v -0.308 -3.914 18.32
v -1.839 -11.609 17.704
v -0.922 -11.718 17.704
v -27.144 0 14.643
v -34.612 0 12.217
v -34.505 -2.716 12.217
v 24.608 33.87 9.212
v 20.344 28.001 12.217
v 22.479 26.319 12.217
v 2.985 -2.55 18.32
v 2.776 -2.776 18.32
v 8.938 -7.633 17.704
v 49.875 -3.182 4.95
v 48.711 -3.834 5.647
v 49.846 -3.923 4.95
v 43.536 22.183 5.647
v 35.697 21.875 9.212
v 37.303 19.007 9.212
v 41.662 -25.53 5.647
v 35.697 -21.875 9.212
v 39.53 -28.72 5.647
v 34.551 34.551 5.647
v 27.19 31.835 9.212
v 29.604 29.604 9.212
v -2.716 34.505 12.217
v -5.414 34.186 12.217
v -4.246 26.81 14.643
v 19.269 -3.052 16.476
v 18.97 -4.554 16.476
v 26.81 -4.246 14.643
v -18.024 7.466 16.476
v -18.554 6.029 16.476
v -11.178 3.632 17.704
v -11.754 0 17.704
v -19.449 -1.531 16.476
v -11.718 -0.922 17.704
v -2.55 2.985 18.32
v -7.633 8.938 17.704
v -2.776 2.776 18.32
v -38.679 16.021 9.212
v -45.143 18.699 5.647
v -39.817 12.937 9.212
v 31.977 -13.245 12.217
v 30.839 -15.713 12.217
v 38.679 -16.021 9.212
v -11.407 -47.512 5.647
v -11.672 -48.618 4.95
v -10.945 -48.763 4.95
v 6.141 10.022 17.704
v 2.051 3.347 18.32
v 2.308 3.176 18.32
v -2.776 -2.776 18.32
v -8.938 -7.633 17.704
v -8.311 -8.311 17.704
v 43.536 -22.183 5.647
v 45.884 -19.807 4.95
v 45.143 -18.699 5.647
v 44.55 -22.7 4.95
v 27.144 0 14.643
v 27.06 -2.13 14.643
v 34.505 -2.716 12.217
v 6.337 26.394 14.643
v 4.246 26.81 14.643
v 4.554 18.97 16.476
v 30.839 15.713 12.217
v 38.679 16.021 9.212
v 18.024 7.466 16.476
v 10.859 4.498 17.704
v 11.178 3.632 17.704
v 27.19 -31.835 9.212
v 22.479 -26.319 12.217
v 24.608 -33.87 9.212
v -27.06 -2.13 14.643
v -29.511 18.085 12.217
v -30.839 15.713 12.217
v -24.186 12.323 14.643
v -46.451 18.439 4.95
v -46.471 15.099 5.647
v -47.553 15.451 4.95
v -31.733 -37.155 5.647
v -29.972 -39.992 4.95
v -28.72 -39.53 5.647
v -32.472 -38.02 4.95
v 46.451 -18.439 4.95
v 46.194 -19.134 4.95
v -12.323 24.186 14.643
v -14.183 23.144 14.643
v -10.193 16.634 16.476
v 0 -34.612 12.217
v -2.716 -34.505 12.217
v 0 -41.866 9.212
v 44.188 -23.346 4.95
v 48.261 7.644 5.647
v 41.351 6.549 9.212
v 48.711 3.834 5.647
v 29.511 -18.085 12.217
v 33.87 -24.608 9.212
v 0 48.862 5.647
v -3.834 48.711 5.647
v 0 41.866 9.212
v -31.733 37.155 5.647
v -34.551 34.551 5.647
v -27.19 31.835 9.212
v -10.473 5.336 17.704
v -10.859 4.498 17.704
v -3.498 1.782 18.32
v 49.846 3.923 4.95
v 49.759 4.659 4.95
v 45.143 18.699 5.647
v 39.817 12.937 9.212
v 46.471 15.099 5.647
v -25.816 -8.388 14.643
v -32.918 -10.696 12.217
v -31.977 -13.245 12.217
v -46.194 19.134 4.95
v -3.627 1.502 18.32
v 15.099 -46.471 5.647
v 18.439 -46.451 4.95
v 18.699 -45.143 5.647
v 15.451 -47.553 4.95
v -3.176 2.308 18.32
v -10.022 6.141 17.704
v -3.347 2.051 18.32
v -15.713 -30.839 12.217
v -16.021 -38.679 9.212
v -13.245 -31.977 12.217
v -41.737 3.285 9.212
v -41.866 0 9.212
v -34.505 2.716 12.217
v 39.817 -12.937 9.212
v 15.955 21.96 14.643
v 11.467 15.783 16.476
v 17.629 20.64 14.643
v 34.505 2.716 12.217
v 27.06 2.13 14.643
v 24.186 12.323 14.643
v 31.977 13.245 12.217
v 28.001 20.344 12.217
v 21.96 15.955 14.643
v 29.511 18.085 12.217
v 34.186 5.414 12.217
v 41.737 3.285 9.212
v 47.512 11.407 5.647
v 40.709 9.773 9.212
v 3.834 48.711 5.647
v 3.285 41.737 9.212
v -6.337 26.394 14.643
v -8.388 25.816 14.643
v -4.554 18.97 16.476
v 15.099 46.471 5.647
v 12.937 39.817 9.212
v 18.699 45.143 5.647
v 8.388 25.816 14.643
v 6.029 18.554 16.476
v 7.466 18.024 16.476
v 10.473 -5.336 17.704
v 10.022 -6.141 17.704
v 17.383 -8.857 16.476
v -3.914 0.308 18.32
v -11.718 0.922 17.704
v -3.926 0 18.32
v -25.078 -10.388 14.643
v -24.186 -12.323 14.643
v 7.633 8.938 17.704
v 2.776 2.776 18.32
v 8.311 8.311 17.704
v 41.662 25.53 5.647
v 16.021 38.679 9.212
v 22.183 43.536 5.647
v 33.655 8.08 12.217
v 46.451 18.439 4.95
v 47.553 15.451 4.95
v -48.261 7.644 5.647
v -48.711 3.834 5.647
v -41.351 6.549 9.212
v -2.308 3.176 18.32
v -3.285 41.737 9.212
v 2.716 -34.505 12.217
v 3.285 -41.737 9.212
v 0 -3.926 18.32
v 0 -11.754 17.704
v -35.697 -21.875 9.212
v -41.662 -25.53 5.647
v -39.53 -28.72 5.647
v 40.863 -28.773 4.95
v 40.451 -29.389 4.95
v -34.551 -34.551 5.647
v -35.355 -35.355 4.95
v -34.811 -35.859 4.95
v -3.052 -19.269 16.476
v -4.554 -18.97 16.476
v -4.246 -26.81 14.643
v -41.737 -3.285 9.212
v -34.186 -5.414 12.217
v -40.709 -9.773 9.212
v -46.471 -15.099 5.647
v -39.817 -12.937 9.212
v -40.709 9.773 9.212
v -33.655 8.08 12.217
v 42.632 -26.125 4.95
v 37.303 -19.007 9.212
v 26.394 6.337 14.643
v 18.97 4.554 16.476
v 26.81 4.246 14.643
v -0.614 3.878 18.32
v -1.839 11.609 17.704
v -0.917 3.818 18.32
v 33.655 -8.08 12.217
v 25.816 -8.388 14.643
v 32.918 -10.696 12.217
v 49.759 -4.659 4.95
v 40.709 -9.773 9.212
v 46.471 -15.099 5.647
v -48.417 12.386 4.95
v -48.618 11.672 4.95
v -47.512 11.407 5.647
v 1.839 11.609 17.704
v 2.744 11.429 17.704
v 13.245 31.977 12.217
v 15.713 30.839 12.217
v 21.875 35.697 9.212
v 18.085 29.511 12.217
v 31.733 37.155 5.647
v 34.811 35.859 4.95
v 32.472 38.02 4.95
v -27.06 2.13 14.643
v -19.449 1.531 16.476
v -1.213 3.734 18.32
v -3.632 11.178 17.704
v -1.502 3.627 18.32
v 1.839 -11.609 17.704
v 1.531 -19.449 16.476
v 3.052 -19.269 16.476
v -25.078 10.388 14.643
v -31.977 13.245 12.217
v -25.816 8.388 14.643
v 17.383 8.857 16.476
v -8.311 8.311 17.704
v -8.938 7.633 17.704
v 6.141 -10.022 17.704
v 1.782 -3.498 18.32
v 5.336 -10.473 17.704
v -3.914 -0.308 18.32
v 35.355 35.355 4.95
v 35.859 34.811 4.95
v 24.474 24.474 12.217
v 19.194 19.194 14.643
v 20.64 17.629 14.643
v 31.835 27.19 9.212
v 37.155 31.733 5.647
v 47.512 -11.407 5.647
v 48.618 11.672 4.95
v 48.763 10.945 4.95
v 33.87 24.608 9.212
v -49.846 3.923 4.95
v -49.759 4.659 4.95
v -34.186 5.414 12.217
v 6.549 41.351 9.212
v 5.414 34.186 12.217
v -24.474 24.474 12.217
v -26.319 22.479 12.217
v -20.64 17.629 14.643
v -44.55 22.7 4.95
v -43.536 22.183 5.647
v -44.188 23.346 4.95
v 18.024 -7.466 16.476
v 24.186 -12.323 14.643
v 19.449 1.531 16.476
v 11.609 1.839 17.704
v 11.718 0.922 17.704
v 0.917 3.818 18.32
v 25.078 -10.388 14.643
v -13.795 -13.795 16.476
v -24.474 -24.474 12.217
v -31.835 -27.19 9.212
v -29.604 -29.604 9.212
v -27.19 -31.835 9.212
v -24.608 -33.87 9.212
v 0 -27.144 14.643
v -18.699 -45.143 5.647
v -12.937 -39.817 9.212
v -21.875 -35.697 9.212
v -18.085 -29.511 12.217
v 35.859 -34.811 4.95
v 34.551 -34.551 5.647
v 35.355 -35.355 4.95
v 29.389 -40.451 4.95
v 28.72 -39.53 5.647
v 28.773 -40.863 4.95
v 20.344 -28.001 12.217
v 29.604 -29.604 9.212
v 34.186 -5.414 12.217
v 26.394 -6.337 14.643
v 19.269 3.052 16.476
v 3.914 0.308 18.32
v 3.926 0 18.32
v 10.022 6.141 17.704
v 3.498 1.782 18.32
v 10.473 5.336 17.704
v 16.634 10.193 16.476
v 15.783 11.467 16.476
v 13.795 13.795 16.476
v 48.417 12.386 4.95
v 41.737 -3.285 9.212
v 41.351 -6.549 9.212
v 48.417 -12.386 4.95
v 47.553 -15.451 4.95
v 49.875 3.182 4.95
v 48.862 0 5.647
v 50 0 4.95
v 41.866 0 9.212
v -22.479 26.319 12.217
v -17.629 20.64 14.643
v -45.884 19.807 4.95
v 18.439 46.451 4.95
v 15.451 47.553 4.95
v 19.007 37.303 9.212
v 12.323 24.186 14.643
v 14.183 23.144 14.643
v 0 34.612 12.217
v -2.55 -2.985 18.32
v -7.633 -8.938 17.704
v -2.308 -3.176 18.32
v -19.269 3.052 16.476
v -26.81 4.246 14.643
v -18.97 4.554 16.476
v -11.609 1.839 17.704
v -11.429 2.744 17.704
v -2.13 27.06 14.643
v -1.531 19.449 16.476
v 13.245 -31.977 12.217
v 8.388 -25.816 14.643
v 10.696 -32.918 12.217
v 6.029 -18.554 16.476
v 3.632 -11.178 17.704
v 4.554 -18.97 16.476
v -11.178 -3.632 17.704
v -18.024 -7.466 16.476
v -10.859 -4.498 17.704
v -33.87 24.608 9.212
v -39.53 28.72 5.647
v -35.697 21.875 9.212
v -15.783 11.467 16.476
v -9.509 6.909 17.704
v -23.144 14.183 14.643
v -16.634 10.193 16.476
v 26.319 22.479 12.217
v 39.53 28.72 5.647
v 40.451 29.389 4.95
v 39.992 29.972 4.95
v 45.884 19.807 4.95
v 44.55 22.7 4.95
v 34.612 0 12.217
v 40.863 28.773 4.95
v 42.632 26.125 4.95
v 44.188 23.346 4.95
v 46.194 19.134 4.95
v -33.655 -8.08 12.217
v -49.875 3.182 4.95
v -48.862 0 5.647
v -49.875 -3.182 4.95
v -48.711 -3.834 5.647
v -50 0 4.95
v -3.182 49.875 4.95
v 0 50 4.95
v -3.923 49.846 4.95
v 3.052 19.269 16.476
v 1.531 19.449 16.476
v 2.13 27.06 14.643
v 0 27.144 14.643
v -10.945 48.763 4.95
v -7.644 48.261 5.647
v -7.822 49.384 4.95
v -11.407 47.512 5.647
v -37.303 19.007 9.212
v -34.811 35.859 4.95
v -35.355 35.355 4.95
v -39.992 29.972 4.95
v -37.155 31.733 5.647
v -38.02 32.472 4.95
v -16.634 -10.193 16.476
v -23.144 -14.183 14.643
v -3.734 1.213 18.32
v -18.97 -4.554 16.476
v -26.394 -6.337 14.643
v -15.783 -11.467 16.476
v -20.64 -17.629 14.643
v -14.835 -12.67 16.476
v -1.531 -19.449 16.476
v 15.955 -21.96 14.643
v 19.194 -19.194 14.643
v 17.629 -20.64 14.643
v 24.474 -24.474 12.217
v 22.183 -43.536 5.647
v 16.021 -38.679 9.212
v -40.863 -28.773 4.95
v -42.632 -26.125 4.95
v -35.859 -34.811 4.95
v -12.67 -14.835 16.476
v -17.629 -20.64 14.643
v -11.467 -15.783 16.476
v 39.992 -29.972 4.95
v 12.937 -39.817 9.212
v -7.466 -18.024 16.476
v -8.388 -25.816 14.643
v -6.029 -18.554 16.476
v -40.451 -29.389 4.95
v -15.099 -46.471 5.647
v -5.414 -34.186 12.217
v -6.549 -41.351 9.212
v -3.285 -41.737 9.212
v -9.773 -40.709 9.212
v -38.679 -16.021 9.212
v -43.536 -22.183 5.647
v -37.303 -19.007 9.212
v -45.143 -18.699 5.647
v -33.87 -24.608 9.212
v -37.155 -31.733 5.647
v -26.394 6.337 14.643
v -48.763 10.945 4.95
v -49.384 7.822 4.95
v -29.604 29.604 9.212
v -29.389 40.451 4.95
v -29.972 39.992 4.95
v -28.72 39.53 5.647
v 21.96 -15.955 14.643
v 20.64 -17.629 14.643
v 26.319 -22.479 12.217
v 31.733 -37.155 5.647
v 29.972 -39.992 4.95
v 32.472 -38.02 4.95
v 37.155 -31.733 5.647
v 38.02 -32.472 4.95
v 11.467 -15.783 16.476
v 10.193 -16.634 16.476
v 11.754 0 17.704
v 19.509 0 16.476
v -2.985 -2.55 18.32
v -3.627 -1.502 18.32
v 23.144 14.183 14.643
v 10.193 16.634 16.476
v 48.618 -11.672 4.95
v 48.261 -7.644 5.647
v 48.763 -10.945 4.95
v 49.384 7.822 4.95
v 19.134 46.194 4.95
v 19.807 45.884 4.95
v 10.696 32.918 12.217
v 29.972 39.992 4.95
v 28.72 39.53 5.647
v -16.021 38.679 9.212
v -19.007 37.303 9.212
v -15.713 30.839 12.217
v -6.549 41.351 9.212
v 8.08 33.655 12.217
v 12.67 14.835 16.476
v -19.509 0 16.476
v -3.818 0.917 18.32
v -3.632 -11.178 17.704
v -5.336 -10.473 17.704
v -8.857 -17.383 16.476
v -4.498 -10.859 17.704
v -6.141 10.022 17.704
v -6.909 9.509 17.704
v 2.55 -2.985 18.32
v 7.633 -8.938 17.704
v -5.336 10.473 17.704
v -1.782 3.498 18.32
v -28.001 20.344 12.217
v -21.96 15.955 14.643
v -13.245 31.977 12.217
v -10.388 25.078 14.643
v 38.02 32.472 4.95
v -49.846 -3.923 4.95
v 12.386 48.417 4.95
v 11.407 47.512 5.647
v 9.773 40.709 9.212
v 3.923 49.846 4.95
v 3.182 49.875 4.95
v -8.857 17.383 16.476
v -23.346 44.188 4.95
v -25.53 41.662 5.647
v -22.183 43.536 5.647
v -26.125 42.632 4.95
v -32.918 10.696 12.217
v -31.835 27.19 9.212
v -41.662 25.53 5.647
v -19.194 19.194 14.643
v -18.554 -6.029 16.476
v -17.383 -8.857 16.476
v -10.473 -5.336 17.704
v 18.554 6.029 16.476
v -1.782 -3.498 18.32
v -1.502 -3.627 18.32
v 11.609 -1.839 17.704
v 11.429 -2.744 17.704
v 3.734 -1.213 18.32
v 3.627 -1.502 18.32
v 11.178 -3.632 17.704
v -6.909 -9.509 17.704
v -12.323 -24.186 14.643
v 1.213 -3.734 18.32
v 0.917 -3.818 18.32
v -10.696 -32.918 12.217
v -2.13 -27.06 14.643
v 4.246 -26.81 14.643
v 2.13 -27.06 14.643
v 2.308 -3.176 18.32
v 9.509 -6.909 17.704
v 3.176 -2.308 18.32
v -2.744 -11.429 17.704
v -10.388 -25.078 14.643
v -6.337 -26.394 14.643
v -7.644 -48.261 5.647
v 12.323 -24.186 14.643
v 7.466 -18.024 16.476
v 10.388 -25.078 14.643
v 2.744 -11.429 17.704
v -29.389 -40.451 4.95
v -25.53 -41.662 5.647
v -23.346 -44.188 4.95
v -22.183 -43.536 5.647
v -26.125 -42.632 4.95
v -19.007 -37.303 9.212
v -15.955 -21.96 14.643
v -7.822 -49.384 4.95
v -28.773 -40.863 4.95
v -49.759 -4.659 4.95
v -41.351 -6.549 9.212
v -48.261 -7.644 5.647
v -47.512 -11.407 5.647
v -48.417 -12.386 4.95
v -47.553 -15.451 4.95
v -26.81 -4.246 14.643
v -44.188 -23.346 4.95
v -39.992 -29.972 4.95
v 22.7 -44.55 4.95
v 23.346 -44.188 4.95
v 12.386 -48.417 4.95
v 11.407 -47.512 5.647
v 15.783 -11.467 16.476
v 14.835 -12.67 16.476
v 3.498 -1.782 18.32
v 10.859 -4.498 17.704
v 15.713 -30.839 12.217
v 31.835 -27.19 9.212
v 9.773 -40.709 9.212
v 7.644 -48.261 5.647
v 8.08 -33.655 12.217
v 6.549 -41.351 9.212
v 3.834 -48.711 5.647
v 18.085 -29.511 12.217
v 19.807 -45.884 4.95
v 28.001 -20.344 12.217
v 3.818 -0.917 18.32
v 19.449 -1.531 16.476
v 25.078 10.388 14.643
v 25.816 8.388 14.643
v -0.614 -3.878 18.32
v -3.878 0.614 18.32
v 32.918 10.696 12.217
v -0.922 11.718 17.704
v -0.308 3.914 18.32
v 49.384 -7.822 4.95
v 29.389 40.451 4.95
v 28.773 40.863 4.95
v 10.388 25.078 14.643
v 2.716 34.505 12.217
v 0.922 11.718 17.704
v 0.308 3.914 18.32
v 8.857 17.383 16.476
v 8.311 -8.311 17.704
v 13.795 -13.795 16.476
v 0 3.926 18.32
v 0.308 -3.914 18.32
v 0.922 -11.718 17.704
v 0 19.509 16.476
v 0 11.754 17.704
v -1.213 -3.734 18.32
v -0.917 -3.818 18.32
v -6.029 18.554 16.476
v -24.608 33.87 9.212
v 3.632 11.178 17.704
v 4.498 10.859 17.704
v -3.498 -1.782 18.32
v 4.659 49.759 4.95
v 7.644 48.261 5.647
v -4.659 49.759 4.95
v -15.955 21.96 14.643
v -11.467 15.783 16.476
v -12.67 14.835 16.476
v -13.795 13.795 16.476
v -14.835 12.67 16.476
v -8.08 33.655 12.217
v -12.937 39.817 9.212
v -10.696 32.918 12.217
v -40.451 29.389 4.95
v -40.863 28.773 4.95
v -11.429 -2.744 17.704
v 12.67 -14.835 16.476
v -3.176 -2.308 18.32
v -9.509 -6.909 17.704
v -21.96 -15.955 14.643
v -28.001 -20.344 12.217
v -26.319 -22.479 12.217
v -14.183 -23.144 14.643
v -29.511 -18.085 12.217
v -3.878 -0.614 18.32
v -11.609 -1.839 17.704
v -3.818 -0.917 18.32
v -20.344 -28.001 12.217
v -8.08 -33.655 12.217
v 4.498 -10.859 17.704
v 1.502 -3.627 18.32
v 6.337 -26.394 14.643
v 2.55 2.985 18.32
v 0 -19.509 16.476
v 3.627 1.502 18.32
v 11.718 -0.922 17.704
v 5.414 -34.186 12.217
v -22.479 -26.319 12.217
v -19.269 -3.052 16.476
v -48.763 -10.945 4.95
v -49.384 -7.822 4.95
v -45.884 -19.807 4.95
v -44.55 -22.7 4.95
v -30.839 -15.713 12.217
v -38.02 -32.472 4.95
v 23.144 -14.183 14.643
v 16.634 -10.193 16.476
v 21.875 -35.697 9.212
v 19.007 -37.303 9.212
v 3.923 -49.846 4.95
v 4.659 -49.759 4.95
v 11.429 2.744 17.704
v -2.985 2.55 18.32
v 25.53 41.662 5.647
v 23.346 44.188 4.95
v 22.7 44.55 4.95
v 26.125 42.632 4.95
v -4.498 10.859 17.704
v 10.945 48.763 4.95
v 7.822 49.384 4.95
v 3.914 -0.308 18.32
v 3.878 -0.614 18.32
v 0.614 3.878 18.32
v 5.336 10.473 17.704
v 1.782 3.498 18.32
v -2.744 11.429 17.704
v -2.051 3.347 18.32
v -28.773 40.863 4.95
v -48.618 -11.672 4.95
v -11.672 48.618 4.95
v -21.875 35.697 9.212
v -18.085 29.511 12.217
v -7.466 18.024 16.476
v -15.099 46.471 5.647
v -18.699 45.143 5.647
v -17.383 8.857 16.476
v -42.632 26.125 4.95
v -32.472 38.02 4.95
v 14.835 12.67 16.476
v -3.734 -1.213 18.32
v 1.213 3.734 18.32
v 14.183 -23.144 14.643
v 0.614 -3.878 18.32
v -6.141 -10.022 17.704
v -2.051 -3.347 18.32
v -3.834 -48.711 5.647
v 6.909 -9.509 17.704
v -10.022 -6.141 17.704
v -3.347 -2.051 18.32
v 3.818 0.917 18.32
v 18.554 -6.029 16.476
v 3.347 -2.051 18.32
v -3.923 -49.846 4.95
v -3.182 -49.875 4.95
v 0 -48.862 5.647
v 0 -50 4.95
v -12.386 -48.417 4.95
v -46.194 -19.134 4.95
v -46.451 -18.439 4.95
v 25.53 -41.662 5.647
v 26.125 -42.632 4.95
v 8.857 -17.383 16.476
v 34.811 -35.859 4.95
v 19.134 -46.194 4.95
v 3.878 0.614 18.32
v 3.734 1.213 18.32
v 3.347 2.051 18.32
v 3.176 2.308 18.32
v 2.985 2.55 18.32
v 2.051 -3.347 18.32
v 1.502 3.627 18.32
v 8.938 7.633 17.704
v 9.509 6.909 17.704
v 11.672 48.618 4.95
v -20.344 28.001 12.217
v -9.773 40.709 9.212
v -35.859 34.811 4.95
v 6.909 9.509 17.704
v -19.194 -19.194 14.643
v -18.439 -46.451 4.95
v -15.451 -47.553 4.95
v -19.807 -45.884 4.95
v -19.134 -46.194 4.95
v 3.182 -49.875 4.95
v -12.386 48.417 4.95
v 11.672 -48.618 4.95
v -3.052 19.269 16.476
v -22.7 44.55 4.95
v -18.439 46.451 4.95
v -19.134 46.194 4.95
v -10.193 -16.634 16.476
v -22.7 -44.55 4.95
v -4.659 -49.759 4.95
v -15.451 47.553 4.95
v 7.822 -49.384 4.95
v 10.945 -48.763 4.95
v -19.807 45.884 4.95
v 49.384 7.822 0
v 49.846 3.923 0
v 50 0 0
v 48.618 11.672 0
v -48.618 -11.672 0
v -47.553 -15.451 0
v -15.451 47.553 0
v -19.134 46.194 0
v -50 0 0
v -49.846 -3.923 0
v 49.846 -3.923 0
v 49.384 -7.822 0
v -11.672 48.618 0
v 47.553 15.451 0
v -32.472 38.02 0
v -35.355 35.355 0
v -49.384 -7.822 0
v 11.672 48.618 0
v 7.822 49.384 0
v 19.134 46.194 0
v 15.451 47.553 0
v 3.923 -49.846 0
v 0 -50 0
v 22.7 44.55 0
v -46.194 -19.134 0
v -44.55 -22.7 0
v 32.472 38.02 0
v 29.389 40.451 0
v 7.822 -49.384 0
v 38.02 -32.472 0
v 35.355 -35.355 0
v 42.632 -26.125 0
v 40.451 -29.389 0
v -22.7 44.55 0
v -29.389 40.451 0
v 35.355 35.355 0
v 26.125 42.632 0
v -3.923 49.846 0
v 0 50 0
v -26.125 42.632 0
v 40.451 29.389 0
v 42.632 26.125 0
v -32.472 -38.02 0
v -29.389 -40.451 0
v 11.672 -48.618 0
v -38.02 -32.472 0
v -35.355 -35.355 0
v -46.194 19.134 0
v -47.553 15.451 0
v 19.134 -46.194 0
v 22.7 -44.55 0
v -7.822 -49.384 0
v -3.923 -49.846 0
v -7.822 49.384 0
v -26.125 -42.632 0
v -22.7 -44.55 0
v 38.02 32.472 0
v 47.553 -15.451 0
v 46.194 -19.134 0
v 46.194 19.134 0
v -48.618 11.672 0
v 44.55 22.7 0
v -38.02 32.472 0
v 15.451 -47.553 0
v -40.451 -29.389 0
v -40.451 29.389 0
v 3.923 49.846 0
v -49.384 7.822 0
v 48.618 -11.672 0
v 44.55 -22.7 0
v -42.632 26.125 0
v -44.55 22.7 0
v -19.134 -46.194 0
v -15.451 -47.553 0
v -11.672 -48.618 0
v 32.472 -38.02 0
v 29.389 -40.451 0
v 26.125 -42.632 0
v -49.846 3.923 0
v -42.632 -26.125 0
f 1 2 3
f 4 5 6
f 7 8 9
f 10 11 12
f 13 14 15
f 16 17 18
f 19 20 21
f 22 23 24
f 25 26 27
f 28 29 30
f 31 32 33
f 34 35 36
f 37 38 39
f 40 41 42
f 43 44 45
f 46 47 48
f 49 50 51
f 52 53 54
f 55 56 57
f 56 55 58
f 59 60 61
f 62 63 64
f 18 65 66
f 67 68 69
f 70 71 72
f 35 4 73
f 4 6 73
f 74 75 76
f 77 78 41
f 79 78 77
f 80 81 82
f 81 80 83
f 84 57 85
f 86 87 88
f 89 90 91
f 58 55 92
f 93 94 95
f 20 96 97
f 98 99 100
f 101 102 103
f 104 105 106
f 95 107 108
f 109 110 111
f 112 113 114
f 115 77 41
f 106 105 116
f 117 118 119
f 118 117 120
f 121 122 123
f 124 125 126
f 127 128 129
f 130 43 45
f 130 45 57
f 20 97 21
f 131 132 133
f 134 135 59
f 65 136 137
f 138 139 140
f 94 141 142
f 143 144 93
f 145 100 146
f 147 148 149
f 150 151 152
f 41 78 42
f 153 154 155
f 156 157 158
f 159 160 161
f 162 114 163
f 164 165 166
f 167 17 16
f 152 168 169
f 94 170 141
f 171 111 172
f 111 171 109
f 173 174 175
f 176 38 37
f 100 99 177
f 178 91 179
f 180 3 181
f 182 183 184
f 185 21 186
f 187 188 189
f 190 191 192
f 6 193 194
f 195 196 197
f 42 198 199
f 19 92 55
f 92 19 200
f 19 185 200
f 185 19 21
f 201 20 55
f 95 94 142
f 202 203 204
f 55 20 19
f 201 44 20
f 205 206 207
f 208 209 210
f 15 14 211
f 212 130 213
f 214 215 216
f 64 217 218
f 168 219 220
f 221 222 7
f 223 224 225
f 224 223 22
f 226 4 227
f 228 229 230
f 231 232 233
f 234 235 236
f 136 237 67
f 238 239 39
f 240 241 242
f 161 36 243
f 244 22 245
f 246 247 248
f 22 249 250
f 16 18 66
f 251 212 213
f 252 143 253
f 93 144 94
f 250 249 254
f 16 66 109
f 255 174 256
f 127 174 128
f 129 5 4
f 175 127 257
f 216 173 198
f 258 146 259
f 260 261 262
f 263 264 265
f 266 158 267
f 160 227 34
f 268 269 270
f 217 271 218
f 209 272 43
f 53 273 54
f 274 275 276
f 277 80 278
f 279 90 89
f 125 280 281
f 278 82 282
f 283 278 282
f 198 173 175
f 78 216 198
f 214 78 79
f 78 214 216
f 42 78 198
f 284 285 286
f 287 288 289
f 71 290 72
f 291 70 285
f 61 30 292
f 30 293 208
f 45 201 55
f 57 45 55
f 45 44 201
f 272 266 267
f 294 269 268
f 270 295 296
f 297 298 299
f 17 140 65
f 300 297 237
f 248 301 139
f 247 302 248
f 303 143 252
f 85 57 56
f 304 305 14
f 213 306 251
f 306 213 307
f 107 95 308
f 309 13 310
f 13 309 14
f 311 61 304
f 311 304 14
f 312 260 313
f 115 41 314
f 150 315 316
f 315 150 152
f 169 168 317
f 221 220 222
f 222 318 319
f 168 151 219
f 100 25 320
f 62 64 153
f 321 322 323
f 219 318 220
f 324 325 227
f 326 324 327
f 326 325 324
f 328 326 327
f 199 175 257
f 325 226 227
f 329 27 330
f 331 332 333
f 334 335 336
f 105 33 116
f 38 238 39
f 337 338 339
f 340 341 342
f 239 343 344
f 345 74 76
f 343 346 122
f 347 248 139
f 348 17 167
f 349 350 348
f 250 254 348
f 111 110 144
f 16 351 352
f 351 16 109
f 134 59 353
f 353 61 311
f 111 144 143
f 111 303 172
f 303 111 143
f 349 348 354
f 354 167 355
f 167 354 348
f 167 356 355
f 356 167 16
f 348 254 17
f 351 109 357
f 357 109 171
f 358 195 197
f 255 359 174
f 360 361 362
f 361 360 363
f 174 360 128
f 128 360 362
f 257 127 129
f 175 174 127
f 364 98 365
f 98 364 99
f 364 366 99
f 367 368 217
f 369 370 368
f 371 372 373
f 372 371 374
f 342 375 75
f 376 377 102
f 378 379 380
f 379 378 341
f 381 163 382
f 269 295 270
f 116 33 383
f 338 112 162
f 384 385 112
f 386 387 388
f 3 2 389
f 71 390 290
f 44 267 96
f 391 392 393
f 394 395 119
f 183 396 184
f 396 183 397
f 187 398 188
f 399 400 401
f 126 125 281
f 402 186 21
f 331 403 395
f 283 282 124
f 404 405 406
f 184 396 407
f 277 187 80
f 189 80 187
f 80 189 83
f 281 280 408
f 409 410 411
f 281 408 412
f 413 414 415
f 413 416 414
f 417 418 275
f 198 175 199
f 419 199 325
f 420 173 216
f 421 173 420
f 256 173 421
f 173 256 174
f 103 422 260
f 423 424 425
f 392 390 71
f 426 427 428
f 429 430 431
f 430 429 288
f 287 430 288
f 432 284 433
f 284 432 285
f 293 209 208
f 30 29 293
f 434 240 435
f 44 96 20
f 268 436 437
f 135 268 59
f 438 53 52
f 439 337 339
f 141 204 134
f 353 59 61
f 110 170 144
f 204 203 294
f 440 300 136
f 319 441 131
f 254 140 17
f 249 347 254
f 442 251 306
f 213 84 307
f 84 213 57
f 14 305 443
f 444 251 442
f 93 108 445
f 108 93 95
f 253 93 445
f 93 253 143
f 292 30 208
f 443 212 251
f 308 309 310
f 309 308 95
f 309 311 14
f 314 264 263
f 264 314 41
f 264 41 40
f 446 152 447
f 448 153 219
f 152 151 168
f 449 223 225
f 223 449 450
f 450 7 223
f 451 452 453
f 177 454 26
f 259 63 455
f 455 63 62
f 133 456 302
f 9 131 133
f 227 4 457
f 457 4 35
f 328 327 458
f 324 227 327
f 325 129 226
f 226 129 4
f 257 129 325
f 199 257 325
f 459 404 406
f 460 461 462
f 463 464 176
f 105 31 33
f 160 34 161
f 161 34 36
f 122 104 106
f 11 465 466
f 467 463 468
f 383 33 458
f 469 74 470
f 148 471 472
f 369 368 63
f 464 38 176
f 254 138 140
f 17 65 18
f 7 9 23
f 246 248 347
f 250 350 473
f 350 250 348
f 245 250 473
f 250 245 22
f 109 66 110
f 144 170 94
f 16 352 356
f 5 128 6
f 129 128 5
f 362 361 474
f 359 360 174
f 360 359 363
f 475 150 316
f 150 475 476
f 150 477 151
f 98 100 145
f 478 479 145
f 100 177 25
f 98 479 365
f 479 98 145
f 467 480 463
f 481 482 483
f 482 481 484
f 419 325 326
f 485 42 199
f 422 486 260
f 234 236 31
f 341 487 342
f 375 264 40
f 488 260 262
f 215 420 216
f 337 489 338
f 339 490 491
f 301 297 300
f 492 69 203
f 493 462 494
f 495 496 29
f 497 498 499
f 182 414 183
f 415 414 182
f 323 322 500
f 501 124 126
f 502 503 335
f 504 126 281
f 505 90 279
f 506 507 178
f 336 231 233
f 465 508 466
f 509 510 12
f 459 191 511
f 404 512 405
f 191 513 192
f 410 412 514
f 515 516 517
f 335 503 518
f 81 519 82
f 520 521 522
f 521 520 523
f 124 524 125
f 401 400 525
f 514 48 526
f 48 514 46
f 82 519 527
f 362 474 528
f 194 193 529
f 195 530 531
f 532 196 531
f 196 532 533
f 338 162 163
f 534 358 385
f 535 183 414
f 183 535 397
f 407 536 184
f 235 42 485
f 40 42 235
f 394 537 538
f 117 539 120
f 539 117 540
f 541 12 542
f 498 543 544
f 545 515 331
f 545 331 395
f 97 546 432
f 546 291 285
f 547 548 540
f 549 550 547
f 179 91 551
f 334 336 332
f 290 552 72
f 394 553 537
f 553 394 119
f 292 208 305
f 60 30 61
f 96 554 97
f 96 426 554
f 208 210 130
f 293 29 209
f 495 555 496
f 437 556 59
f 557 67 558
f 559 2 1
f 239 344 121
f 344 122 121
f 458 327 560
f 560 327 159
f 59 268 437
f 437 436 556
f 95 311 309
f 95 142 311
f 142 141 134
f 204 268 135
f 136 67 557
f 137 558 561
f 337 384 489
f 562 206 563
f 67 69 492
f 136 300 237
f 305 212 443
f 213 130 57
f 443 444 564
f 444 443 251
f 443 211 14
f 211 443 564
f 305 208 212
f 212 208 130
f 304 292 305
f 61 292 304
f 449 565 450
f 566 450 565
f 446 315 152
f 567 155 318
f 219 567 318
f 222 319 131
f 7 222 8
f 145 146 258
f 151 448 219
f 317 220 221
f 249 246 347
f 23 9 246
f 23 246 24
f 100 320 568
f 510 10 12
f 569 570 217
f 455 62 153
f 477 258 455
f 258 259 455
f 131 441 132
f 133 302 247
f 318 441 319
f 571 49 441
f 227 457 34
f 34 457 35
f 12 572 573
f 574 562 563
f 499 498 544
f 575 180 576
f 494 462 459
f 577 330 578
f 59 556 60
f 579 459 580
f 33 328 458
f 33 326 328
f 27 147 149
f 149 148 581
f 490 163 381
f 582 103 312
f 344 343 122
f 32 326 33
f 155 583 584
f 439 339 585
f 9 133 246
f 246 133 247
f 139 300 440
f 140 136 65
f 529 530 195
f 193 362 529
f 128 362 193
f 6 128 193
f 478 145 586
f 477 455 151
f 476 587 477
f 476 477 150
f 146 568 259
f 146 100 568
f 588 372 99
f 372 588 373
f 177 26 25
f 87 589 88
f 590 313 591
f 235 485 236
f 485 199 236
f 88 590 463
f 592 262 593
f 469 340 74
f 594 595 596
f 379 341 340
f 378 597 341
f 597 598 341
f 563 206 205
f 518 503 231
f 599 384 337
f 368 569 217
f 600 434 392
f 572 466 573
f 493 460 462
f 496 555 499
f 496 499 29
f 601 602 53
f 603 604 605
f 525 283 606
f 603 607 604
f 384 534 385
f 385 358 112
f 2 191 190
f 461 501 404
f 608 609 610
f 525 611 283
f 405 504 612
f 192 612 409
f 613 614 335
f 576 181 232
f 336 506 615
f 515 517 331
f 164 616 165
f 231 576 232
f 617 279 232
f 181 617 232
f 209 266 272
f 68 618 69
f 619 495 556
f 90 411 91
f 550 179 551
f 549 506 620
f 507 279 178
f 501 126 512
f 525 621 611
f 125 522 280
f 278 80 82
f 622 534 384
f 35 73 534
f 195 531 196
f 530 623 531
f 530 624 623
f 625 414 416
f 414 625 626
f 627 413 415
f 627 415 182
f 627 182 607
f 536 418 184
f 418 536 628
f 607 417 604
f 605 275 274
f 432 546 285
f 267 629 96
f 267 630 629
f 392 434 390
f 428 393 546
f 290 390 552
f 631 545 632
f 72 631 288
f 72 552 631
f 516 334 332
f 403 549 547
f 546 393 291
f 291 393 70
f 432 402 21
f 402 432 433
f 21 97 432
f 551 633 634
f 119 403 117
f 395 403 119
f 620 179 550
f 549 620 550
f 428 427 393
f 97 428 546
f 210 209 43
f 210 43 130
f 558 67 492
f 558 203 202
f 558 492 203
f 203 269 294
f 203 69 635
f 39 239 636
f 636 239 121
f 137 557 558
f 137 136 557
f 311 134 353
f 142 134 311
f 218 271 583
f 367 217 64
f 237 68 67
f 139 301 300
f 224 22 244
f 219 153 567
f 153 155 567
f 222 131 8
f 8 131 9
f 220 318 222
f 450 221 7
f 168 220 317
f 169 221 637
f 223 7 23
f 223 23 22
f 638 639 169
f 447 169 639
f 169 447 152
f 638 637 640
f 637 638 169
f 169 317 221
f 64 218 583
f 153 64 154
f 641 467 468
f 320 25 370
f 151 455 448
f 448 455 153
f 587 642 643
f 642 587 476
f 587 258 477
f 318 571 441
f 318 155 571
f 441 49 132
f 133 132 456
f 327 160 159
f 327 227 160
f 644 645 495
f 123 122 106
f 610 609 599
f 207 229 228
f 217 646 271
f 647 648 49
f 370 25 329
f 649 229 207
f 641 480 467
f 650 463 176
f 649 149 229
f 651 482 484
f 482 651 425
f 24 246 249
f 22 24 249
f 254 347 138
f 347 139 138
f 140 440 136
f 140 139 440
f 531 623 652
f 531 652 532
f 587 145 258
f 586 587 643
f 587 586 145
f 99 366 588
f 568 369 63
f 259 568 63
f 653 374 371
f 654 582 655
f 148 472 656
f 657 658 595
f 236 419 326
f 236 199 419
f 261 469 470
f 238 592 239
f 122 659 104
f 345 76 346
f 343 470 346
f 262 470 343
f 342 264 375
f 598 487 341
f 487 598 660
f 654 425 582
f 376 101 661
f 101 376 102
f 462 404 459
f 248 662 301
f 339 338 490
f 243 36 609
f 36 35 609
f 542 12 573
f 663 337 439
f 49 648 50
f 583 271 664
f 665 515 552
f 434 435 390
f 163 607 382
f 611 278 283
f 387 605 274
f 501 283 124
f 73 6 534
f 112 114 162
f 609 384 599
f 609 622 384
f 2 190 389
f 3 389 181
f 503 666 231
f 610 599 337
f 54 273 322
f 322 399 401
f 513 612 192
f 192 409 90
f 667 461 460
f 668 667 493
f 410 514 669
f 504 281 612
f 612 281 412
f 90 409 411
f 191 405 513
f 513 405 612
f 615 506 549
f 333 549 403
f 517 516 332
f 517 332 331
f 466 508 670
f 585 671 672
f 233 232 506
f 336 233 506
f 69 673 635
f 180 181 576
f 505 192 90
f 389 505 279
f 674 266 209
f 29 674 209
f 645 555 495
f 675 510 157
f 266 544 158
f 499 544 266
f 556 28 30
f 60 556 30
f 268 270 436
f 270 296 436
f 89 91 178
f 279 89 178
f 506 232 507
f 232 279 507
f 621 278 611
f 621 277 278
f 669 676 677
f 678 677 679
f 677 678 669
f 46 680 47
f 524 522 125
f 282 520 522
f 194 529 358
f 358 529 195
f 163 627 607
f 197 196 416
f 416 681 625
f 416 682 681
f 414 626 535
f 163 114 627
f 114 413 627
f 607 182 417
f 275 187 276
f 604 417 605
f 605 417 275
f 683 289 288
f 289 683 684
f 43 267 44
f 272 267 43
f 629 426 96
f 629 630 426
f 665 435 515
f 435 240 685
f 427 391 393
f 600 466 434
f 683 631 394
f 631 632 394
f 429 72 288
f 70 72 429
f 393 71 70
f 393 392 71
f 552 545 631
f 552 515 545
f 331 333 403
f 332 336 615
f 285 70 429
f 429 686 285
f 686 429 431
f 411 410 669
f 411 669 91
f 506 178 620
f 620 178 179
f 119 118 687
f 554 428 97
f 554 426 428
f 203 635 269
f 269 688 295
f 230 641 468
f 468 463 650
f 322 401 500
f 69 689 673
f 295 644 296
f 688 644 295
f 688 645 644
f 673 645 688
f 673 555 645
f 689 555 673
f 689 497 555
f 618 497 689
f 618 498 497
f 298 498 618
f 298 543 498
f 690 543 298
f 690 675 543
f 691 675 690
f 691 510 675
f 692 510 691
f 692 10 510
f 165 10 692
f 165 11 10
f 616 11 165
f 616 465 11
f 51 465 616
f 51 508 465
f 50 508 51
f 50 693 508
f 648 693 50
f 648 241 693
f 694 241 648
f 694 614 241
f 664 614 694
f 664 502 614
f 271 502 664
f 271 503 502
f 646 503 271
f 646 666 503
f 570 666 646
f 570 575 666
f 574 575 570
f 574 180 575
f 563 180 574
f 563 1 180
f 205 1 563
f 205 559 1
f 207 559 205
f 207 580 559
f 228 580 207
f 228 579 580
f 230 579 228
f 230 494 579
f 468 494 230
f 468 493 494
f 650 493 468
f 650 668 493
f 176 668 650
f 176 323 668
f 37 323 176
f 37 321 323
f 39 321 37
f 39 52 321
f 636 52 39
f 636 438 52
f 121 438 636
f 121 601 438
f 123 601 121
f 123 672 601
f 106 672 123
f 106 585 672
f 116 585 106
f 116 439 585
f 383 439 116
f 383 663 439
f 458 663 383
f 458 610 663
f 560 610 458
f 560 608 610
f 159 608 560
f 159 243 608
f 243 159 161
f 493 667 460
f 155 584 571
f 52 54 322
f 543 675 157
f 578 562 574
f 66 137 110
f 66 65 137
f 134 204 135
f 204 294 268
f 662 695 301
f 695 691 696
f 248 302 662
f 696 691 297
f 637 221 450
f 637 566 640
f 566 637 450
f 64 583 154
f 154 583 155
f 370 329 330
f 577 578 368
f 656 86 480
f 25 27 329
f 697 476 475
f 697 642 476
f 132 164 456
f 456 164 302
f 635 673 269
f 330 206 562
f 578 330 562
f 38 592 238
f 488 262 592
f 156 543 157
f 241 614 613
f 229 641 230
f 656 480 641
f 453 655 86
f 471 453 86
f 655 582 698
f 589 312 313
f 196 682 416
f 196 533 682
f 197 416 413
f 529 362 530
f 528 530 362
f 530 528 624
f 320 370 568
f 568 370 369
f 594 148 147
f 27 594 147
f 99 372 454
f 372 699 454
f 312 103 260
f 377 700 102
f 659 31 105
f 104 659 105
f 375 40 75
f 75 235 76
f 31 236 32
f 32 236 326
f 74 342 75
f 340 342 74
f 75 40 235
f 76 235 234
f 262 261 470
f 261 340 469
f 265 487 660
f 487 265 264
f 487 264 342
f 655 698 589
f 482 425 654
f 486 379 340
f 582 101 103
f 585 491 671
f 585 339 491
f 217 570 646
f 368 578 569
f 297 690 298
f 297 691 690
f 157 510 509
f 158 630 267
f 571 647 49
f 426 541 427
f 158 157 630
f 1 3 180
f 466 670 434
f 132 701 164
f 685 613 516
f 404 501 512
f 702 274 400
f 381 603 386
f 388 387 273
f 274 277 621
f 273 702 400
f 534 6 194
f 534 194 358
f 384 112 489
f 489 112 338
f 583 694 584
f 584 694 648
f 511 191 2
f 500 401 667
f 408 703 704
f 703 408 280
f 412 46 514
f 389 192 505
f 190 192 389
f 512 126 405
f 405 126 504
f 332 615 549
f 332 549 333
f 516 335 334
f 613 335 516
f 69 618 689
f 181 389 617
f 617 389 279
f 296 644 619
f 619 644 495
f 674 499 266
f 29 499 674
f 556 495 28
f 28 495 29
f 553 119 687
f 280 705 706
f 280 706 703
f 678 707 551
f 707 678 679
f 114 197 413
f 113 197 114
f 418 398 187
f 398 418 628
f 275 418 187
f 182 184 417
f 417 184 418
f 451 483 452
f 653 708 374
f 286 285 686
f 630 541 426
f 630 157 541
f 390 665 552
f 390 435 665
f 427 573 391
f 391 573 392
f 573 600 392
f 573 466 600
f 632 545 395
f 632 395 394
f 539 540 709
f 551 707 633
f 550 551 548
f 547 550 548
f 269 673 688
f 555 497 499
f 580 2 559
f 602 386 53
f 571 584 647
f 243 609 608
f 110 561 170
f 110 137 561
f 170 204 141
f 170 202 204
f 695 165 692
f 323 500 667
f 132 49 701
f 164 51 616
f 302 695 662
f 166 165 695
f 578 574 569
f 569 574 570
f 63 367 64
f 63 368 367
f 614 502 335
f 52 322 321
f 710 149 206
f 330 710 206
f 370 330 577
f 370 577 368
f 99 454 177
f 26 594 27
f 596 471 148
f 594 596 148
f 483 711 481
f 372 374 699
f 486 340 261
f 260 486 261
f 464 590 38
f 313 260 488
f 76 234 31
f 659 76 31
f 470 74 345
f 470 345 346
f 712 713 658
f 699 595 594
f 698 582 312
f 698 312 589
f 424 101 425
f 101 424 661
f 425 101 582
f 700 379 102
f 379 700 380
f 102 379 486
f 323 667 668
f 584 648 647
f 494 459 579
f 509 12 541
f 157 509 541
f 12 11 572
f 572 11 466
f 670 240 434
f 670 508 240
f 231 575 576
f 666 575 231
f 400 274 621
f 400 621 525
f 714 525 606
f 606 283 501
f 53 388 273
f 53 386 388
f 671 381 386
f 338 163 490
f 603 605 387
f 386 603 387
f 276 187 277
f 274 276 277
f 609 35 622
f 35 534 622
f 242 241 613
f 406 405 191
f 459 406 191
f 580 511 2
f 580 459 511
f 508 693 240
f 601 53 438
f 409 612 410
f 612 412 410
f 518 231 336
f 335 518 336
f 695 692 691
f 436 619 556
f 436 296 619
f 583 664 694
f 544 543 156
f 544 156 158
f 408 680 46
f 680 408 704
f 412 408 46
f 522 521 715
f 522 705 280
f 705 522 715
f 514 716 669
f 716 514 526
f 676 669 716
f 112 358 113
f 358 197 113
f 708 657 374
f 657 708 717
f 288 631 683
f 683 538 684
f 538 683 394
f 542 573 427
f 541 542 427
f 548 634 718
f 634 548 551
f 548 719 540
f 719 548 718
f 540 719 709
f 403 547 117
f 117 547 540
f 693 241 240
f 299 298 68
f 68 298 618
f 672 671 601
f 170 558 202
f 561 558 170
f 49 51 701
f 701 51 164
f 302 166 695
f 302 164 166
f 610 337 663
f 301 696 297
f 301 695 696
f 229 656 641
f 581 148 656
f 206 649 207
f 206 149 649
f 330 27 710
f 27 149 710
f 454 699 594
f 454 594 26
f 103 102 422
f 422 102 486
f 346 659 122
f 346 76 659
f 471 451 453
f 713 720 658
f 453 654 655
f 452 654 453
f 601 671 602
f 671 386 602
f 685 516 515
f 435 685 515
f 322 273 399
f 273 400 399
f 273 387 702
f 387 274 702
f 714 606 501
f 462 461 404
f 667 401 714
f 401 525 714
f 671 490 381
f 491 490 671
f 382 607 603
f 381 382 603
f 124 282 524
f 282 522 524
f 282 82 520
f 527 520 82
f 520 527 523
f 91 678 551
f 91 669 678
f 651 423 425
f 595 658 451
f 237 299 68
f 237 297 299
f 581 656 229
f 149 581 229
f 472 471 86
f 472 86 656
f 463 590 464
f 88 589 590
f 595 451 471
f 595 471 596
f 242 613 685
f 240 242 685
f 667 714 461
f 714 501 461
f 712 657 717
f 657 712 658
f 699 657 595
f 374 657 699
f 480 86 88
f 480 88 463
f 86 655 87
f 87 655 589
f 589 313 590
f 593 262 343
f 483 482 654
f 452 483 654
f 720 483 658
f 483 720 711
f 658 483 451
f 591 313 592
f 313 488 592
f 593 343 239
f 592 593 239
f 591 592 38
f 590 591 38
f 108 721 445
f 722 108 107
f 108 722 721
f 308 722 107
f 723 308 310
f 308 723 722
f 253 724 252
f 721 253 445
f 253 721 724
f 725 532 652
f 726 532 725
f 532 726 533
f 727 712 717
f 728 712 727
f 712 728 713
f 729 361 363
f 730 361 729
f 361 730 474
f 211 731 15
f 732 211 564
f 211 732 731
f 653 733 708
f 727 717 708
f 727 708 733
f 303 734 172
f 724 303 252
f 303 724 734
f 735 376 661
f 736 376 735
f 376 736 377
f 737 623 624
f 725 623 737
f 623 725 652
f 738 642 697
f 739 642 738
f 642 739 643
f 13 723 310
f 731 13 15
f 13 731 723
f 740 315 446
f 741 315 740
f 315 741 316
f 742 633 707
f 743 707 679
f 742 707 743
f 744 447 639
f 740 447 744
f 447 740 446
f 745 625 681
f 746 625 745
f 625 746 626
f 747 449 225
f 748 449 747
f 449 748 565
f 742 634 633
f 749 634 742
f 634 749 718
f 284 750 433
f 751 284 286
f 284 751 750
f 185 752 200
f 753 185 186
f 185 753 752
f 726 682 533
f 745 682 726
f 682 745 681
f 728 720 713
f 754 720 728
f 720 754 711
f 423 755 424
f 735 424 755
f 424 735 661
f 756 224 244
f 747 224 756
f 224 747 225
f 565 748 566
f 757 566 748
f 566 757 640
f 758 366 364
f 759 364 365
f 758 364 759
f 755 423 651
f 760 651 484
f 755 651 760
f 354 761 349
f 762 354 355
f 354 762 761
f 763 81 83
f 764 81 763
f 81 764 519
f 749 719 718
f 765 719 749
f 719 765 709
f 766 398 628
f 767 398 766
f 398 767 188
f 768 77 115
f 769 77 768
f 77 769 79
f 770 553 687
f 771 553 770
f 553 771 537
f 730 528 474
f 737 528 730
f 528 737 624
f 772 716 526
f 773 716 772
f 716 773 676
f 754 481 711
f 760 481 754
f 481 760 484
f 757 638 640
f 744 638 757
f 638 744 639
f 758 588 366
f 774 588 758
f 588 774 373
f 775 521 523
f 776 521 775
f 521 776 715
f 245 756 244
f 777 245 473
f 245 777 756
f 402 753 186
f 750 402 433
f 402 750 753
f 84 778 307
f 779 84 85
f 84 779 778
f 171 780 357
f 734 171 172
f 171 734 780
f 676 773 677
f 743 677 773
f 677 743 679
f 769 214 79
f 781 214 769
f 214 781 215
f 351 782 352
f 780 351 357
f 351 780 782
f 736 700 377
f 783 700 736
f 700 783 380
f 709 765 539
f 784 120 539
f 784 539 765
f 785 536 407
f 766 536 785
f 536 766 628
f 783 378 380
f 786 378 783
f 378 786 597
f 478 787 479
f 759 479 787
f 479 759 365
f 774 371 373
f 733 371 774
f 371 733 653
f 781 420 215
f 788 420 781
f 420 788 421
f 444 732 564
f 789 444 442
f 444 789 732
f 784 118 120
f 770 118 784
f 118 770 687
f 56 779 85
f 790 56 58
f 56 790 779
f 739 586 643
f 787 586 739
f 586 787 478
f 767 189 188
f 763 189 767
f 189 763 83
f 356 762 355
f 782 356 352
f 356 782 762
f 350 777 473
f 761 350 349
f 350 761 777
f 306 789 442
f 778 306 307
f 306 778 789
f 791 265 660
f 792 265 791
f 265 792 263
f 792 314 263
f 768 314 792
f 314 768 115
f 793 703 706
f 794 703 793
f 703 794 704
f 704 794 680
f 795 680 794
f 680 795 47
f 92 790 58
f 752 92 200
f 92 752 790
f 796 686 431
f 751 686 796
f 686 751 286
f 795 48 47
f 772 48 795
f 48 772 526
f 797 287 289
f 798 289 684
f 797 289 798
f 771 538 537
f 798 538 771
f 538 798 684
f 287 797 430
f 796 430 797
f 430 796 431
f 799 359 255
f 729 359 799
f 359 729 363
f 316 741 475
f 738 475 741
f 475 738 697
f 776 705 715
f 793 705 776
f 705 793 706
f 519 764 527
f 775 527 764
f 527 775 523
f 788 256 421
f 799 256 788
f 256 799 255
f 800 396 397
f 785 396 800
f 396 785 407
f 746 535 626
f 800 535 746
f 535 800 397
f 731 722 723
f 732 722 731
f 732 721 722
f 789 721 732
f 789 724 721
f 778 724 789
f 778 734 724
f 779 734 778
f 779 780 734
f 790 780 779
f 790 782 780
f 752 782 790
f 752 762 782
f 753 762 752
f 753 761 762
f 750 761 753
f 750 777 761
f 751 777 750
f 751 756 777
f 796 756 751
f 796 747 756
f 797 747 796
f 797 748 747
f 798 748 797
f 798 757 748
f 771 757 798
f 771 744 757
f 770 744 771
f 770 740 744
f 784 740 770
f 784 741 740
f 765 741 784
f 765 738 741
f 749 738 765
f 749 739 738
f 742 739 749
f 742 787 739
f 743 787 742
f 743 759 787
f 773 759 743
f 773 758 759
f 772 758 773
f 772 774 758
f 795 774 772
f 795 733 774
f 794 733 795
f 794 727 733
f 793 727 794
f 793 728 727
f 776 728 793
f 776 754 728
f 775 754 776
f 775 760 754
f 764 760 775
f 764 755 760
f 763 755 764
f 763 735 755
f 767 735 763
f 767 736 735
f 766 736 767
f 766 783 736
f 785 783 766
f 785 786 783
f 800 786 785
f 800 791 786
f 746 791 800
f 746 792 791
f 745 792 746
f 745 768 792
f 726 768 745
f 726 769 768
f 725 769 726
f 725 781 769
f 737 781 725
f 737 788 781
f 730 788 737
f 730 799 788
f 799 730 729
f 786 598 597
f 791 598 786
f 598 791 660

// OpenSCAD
/* [Lens Parameters] */
lensDiameter=100;
//in mm
focalLength=200;
//in mm 
thicknessAddend = 5;
//in mm
// Adjust upward for finer quality.
$fn=80;

/* [Hidden] */

lensRadius = lensDiameter/2;
sphereRadius = focalLength/2;
lensBottom = sqrt((sphereRadius*sphereRadius) - (lensRadius*lensRadius))-thicknessAddend;

translate([0,0,-lensBottom])
intersection(){
//sphere(5);
sphere(r=sphereRadius);
translate([0,0,lensBottom]) cylinder(h = focalLength, r1 = lensRadius, r2 = lensRadius);
}
